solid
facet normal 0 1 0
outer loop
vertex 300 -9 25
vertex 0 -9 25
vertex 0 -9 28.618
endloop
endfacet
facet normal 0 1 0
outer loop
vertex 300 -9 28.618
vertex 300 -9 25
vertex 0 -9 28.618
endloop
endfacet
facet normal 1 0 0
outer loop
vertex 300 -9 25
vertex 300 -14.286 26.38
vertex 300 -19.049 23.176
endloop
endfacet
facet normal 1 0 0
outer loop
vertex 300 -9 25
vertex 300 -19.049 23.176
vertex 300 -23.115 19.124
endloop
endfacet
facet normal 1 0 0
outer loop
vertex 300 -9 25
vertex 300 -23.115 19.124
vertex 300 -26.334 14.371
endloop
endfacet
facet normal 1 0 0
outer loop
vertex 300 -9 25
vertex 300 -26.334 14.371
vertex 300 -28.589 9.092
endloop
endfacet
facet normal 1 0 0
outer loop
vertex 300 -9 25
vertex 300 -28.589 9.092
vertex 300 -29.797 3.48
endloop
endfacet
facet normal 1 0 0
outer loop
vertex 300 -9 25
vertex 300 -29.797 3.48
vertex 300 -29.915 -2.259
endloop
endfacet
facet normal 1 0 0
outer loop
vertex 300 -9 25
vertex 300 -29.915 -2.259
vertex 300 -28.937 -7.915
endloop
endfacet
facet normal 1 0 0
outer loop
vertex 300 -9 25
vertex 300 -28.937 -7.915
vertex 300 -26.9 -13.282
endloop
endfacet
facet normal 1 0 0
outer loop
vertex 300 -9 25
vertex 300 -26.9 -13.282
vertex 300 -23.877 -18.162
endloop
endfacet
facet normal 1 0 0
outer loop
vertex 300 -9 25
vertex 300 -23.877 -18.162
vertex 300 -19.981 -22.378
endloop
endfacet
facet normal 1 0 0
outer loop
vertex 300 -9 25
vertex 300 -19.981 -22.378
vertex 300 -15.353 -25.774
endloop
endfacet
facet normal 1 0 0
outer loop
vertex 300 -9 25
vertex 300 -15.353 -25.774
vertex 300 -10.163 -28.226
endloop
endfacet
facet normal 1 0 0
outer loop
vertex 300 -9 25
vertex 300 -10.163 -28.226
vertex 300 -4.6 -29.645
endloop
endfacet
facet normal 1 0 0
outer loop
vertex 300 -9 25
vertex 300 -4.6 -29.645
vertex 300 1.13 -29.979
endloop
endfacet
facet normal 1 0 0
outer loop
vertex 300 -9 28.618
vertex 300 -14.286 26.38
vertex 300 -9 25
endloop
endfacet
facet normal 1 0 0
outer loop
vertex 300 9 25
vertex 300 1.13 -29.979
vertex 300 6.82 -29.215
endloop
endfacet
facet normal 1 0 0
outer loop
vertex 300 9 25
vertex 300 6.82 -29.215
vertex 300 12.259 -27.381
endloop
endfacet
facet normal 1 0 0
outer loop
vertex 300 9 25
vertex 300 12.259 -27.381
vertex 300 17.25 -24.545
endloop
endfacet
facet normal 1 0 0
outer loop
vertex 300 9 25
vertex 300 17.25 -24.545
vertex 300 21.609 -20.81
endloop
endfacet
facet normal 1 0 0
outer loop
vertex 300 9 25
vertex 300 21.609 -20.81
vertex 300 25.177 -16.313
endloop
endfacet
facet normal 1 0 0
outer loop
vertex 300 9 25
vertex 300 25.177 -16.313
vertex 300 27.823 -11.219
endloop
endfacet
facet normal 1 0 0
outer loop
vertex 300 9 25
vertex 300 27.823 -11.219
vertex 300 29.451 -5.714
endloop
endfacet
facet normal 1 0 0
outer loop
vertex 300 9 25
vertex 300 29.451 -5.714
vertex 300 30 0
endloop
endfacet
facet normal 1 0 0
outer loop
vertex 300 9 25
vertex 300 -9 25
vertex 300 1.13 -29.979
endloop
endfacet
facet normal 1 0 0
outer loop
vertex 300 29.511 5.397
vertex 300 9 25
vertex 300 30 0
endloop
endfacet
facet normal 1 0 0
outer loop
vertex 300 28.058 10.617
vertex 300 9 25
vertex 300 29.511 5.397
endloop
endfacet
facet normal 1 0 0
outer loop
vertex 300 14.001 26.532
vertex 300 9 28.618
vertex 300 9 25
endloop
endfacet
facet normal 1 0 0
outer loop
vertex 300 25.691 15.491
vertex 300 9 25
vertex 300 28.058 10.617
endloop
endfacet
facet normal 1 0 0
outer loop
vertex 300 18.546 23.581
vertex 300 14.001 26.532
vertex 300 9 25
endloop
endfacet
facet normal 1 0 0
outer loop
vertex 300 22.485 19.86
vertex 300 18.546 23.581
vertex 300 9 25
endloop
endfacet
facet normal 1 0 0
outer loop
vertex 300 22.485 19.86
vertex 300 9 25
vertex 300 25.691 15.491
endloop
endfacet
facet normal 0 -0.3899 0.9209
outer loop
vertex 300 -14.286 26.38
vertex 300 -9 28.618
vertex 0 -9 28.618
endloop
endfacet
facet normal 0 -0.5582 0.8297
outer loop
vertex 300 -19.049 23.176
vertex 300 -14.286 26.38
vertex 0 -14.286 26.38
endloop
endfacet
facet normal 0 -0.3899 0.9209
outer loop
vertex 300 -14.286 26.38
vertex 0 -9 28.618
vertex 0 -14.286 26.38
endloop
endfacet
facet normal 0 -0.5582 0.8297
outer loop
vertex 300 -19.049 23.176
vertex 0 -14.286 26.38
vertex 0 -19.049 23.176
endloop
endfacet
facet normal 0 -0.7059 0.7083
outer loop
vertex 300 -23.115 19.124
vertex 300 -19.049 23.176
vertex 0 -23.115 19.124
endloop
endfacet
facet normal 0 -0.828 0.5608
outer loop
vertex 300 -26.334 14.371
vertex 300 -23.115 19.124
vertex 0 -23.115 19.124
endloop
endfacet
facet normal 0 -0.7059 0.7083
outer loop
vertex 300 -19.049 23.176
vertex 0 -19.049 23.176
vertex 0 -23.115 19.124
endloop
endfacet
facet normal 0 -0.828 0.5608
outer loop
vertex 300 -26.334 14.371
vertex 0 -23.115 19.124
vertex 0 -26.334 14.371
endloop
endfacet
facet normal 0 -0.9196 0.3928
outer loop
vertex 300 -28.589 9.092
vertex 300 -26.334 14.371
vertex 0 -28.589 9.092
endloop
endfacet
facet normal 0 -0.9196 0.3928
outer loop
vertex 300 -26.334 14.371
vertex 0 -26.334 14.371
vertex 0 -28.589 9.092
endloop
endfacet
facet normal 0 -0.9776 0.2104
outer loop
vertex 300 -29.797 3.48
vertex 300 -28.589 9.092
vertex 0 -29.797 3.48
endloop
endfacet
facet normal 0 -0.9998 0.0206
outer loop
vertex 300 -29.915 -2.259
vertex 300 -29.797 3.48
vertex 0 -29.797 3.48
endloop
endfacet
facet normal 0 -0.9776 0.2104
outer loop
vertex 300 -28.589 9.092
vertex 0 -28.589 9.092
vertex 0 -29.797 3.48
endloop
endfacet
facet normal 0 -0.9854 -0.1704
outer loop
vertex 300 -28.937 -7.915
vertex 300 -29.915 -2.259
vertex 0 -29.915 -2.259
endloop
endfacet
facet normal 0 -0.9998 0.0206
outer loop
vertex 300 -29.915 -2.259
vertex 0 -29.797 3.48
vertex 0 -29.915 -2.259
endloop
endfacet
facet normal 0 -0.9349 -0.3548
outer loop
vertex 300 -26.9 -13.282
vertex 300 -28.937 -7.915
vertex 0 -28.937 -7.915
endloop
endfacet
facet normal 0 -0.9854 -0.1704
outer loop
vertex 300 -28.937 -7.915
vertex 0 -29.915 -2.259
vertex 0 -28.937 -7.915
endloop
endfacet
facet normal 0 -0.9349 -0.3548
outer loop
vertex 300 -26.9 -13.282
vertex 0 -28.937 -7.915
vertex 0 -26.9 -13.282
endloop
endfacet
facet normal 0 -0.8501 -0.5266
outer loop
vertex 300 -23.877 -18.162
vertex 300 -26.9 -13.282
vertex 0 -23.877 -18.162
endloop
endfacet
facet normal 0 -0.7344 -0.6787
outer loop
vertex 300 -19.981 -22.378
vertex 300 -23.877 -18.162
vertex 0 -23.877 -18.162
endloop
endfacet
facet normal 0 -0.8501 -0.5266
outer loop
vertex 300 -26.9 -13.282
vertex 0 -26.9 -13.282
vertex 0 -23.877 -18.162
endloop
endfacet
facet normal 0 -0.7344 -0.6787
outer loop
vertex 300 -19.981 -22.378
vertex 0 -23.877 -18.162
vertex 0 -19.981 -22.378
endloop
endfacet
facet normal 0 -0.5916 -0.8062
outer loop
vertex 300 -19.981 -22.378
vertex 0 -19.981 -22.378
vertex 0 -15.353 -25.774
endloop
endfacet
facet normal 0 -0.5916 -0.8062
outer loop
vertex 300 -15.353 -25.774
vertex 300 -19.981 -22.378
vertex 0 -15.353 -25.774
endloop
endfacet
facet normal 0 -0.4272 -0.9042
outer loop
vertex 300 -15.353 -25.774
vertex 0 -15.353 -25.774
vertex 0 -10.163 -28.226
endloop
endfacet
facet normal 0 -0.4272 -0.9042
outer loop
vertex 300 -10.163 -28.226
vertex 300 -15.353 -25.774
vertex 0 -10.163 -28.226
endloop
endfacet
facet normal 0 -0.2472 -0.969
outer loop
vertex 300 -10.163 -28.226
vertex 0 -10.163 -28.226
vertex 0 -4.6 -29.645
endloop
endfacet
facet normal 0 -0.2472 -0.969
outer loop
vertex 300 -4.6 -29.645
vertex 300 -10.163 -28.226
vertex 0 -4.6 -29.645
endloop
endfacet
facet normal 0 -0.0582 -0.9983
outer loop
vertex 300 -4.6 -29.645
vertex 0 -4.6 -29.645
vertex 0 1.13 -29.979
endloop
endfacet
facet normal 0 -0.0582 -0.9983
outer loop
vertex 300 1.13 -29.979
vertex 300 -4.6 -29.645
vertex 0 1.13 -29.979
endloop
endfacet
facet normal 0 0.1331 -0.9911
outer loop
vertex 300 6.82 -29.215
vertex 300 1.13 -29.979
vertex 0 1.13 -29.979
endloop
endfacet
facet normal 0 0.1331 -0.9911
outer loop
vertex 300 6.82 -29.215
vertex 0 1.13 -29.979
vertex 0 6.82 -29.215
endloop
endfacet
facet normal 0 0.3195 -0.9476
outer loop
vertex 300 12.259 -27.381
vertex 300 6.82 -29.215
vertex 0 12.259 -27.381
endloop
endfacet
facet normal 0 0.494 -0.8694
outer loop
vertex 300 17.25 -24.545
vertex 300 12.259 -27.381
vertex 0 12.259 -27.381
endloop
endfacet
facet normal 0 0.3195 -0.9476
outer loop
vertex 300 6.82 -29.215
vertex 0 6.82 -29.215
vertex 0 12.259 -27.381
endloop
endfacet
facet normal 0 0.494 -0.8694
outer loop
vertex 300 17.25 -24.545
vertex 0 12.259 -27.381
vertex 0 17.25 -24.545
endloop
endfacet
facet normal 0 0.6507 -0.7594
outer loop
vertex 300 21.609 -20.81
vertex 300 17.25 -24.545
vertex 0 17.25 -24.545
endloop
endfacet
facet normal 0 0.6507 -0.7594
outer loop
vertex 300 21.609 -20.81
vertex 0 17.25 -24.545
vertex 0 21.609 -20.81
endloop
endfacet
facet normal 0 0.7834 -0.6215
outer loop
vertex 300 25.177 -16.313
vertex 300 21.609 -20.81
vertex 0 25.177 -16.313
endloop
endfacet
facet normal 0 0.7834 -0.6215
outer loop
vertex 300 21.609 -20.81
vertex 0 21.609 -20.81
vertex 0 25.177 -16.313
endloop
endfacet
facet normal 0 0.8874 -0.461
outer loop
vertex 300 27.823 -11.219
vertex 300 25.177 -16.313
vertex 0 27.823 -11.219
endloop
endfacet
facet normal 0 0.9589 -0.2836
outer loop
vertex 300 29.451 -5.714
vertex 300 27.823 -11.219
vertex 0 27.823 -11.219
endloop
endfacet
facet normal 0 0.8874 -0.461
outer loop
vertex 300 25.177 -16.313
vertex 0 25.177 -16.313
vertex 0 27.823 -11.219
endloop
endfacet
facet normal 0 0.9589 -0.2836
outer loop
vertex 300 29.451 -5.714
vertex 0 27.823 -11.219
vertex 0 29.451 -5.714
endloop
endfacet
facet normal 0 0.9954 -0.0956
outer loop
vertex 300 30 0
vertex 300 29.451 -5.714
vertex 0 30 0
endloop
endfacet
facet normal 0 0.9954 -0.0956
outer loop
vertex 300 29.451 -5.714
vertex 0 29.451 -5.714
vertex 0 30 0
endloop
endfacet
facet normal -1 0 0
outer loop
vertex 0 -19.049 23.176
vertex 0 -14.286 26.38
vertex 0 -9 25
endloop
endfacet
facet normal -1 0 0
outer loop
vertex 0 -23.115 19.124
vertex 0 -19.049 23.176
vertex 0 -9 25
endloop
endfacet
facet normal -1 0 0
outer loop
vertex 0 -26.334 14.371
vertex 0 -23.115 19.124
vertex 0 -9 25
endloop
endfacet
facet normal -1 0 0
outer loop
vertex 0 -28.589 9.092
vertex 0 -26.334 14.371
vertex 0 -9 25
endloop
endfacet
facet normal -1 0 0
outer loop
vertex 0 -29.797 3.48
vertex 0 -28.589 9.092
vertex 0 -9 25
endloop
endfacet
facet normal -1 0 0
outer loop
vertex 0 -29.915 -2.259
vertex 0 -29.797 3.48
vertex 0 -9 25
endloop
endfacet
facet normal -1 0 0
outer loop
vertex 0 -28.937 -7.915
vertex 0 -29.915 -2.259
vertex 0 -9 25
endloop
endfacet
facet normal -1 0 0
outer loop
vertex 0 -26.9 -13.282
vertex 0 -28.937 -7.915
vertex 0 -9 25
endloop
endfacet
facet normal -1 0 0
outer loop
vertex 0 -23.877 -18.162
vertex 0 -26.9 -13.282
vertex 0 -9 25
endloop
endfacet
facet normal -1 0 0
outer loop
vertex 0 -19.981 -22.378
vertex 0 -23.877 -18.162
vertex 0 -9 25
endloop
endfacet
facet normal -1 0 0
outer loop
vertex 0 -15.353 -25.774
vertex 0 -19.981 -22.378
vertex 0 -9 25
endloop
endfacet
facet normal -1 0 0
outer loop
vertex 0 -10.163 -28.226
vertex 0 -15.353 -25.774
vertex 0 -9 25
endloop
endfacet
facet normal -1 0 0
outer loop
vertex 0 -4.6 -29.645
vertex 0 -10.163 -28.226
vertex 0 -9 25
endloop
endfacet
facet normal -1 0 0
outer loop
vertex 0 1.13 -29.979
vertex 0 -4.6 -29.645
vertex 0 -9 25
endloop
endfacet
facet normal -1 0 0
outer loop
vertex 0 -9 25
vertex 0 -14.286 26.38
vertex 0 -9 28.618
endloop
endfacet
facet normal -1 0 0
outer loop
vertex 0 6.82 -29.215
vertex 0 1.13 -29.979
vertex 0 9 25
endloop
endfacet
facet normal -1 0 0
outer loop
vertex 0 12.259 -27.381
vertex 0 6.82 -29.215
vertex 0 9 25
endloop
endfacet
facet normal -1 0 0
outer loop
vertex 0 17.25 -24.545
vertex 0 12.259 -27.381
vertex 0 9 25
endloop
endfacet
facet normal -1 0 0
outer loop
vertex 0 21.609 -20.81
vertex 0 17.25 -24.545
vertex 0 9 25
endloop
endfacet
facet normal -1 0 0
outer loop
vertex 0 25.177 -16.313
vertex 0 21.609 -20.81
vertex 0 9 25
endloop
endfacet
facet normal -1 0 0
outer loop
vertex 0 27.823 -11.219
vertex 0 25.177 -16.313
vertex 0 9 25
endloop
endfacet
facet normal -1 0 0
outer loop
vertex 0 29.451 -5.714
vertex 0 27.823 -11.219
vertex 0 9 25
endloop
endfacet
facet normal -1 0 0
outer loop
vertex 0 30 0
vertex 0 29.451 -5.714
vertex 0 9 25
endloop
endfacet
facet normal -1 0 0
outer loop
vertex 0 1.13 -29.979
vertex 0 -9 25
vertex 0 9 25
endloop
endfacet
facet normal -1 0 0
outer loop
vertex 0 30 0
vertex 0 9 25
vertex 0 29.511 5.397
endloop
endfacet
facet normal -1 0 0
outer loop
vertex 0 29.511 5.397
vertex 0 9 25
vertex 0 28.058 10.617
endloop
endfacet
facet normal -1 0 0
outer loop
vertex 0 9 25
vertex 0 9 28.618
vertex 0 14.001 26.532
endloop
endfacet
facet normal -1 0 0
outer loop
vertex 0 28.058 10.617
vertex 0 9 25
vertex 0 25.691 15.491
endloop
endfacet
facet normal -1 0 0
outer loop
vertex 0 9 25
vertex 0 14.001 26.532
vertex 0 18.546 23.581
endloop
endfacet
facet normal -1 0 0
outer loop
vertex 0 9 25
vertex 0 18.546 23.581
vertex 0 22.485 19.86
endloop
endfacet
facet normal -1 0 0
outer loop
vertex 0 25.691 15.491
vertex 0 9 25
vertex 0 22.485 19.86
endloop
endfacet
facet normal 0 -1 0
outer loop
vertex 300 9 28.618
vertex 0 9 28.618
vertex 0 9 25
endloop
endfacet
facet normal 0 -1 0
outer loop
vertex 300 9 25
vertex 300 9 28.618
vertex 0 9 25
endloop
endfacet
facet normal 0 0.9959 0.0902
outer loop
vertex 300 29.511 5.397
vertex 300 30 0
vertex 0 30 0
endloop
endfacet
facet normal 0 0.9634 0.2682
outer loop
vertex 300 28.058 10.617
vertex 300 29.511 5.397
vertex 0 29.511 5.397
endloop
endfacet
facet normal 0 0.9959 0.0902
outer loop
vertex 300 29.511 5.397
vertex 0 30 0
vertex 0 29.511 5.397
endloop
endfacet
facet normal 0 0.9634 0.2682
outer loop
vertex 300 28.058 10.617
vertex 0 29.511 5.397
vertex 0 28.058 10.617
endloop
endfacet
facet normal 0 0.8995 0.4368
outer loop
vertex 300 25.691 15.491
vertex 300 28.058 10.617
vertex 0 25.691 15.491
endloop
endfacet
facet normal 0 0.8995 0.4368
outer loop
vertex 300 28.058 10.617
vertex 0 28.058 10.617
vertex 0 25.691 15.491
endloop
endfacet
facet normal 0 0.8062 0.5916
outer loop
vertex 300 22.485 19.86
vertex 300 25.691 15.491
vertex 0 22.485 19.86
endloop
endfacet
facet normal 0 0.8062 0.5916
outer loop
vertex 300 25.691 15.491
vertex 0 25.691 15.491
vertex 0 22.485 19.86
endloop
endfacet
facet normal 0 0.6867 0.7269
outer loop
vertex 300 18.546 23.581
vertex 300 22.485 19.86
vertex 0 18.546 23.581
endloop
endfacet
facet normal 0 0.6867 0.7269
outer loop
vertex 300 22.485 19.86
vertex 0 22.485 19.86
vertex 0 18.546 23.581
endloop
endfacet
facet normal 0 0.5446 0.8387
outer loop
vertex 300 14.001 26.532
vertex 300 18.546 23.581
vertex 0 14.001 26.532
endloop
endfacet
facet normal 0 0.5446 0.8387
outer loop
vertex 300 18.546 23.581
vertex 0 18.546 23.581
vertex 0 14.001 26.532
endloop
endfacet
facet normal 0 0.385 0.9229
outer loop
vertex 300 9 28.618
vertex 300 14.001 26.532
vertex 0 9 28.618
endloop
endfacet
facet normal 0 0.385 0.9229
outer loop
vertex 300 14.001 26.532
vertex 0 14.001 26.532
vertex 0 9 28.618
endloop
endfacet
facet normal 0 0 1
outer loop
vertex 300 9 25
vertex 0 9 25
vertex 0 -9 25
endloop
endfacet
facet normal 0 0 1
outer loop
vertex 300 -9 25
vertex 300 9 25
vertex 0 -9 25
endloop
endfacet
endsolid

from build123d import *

# Parameters (mm, degrees)
F1_DEPTH = 300


with BuildPart() as f1:
    # F0 (on Right) → F1 (new body)
    with BuildSketch(Plane.YZ):
        with BuildLine():
            ThreePointArc((-9, 28.618176), (-17.748239, -24.186773), (30, 0))
            ThreePointArc((30, 0), (24.186773, 17.748239), (9, 28.618176))
            Line((9, 28.618176), (9, 25))
            Line((9, 25), (0, 25))
            Line((0, 25), (-9, 25))
            Line((-9, 25), (-9, 28.618176))
        make_face()
    extrude(amount=F1_DEPTH)


solid = f1.part
